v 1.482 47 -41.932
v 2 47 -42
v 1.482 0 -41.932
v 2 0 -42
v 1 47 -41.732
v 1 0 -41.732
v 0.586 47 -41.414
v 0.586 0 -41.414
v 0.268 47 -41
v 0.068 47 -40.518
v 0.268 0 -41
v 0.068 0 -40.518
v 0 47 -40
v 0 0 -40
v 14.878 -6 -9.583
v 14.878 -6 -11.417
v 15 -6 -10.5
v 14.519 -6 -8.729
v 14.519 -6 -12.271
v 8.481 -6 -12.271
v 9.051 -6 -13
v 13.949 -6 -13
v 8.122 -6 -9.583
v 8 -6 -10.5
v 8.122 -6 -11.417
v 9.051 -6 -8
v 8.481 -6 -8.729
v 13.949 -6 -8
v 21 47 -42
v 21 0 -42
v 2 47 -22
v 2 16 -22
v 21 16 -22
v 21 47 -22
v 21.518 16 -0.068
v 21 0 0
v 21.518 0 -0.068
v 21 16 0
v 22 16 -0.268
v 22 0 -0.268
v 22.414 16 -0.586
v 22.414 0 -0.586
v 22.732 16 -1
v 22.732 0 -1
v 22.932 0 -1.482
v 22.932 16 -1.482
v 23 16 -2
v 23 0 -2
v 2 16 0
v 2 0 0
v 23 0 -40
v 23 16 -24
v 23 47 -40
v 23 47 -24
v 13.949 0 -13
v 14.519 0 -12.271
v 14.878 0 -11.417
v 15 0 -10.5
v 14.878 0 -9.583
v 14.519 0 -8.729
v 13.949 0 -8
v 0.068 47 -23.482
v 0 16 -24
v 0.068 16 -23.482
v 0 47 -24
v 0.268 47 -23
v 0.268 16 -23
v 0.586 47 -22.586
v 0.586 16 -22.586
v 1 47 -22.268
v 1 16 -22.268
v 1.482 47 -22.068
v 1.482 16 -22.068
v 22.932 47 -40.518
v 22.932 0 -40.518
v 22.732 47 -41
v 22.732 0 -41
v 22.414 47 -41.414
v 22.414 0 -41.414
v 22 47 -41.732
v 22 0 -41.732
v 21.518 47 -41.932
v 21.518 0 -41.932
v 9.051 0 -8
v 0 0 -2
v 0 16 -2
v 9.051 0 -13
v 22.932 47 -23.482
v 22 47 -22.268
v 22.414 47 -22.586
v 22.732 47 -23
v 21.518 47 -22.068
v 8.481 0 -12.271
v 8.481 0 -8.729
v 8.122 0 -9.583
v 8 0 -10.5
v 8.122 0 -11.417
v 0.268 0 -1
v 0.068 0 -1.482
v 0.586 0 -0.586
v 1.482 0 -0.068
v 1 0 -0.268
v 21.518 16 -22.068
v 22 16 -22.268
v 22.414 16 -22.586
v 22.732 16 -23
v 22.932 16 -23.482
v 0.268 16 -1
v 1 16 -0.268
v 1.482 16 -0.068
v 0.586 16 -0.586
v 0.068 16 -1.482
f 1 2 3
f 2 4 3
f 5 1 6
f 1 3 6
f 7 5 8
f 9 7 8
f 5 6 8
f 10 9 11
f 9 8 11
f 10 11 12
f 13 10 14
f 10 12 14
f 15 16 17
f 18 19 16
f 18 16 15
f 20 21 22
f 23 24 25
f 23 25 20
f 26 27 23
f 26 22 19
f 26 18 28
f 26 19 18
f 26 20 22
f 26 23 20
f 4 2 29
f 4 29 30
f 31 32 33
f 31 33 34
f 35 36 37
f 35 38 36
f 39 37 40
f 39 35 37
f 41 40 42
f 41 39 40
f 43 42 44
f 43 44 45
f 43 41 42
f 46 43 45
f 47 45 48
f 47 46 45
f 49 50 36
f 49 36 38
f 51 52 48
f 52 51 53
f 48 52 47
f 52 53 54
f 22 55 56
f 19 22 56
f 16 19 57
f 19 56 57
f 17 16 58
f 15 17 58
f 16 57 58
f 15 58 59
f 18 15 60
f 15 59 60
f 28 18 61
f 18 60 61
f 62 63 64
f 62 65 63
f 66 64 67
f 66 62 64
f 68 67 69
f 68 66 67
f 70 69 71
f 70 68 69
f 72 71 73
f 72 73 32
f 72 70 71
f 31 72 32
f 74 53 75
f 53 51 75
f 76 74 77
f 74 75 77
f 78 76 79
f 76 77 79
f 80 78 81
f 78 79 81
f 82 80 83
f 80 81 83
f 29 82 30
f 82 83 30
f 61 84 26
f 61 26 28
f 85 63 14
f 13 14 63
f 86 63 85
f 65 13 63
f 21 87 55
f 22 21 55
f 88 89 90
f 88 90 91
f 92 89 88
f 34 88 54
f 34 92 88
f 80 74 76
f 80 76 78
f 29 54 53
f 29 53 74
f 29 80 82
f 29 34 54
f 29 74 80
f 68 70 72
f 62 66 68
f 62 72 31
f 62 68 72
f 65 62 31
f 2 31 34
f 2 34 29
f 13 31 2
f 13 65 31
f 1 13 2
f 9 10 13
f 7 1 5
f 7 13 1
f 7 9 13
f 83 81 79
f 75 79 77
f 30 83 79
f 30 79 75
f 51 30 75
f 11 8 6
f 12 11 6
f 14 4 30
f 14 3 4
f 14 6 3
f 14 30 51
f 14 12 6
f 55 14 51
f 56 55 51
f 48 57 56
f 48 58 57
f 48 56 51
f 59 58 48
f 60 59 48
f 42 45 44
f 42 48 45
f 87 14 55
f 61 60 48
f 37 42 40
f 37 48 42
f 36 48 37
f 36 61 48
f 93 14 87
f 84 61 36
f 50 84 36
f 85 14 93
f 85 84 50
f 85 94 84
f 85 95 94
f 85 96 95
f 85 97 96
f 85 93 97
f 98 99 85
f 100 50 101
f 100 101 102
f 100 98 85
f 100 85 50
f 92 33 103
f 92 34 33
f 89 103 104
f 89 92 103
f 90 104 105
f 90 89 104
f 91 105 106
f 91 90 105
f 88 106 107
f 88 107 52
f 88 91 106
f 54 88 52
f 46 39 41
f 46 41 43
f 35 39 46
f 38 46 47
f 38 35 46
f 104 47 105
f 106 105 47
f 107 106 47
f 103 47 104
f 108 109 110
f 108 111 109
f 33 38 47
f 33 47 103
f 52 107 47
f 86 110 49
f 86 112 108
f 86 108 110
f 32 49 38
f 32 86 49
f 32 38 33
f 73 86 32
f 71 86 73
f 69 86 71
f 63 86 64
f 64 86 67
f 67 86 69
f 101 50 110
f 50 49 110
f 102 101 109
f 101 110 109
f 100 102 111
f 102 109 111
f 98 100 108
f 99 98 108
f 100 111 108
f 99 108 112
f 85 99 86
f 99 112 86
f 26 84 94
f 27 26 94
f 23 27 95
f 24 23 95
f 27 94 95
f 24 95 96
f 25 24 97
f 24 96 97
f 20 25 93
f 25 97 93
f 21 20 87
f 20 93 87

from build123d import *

# Parameters (mm, degrees)
BOSS_EXTRUDE1_DEPTH = 23
SKETCH2_R           = 3.5
BOSS_EXTRUDE2_DEPTH = 6
FILLET3_R           = 2
FILLET4_R           = 2
FILLET5_R           = 2
FILLET6_R           = 2
FILLET7_R           = 2
FILLET8_R           = 2
CUT_EXTRUDE2_START  = -6
CUT_EXTRUDE2_DEPTH  = 6


with BuildPart() as part:
    # Sketch1 → Boss-Extrude1 (new body)
    with BuildSketch(Plane(origin=(0, 0, 0), x_dir=(0, 0, -1), z_dir=(1, 0, 0))):
        Polygon((0, 0), (0, 16), (22, 16), (22, 47), (42, 47), (42, 0), align=None)
    extrude(amount=BOSS_EXTRUDE1_DEPTH)

    # Sketch2 → Boss-Extrude2 (add)
    with BuildSketch(Plane(origin=(0, 0, 0), x_dir=(-1, 0, 0), z_dir=(0, -1, 0))):
        with Locations(Location((-11.5, 10.5, 0), (0, 0, 270))):
            Circle(SKETCH2_R)
    extrude(amount=BOSS_EXTRUDE2_DEPTH)

    # Fillet3
    fillet3_edges = [part.edges().sort_by_distance(p)[0] for p in [
        (23, 8, 0),
    ]]
    fillet(fillet3_edges, radius=FILLET3_R)

    # Fillet4
    fillet4_edges = [part.edges().sort_by_distance(p)[0] for p in [
        (0, 8, 0),
    ]]
    fillet(fillet4_edges, radius=FILLET4_R)

    # Fillet5
    fillet5_edges = [part.edges().sort_by_distance(p)[0] for p in [
        (23, 23.5, -42),
    ]]
    fillet(fillet5_edges, radius=FILLET5_R)

    # Fillet6
    fillet6_edges = [part.edges().sort_by_distance(p)[0] for p in [
        (0, 23.5, -42),
    ]]
    fillet(fillet6_edges, radius=FILLET6_R)

    # Fillet7
    fillet7_edges = [part.edges().sort_by_distance(p)[0] for p in [
        (0, 31.5, -22),
    ]]
    fillet(fillet7_edges, radius=FILLET7_R)

    # Fillet8
    fillet8_edges = [part.edges().sort_by_distance(p)[0] for p in [
        (23, 31.5, -22),
    ]]
    fillet(fillet8_edges, radius=FILLET8_R)

    # Sketch3 → Cut-Extrude2 (cut)
    with BuildSketch(Plane.XZ.offset(6).offset(CUT_EXTRUDE2_START)):
        with BuildLine():
            Line((9.050510257, -13), (13.949489743, -13))
            ThreePointArc((13.949489743, -13), (11.5, -14), (9.050510257, -13))
        make_face()
        with BuildLine():
            Line((9.050510257, -8), (13.949489743, -8))
            ThreePointArc((13.949489743, -8), (11.5, -7), (9.050510257, -8))
        make_face()
    extrude(amount=CUT_EXTRUDE2_DEPTH, mode=Mode.SUBTRACT)


solid = part.part
